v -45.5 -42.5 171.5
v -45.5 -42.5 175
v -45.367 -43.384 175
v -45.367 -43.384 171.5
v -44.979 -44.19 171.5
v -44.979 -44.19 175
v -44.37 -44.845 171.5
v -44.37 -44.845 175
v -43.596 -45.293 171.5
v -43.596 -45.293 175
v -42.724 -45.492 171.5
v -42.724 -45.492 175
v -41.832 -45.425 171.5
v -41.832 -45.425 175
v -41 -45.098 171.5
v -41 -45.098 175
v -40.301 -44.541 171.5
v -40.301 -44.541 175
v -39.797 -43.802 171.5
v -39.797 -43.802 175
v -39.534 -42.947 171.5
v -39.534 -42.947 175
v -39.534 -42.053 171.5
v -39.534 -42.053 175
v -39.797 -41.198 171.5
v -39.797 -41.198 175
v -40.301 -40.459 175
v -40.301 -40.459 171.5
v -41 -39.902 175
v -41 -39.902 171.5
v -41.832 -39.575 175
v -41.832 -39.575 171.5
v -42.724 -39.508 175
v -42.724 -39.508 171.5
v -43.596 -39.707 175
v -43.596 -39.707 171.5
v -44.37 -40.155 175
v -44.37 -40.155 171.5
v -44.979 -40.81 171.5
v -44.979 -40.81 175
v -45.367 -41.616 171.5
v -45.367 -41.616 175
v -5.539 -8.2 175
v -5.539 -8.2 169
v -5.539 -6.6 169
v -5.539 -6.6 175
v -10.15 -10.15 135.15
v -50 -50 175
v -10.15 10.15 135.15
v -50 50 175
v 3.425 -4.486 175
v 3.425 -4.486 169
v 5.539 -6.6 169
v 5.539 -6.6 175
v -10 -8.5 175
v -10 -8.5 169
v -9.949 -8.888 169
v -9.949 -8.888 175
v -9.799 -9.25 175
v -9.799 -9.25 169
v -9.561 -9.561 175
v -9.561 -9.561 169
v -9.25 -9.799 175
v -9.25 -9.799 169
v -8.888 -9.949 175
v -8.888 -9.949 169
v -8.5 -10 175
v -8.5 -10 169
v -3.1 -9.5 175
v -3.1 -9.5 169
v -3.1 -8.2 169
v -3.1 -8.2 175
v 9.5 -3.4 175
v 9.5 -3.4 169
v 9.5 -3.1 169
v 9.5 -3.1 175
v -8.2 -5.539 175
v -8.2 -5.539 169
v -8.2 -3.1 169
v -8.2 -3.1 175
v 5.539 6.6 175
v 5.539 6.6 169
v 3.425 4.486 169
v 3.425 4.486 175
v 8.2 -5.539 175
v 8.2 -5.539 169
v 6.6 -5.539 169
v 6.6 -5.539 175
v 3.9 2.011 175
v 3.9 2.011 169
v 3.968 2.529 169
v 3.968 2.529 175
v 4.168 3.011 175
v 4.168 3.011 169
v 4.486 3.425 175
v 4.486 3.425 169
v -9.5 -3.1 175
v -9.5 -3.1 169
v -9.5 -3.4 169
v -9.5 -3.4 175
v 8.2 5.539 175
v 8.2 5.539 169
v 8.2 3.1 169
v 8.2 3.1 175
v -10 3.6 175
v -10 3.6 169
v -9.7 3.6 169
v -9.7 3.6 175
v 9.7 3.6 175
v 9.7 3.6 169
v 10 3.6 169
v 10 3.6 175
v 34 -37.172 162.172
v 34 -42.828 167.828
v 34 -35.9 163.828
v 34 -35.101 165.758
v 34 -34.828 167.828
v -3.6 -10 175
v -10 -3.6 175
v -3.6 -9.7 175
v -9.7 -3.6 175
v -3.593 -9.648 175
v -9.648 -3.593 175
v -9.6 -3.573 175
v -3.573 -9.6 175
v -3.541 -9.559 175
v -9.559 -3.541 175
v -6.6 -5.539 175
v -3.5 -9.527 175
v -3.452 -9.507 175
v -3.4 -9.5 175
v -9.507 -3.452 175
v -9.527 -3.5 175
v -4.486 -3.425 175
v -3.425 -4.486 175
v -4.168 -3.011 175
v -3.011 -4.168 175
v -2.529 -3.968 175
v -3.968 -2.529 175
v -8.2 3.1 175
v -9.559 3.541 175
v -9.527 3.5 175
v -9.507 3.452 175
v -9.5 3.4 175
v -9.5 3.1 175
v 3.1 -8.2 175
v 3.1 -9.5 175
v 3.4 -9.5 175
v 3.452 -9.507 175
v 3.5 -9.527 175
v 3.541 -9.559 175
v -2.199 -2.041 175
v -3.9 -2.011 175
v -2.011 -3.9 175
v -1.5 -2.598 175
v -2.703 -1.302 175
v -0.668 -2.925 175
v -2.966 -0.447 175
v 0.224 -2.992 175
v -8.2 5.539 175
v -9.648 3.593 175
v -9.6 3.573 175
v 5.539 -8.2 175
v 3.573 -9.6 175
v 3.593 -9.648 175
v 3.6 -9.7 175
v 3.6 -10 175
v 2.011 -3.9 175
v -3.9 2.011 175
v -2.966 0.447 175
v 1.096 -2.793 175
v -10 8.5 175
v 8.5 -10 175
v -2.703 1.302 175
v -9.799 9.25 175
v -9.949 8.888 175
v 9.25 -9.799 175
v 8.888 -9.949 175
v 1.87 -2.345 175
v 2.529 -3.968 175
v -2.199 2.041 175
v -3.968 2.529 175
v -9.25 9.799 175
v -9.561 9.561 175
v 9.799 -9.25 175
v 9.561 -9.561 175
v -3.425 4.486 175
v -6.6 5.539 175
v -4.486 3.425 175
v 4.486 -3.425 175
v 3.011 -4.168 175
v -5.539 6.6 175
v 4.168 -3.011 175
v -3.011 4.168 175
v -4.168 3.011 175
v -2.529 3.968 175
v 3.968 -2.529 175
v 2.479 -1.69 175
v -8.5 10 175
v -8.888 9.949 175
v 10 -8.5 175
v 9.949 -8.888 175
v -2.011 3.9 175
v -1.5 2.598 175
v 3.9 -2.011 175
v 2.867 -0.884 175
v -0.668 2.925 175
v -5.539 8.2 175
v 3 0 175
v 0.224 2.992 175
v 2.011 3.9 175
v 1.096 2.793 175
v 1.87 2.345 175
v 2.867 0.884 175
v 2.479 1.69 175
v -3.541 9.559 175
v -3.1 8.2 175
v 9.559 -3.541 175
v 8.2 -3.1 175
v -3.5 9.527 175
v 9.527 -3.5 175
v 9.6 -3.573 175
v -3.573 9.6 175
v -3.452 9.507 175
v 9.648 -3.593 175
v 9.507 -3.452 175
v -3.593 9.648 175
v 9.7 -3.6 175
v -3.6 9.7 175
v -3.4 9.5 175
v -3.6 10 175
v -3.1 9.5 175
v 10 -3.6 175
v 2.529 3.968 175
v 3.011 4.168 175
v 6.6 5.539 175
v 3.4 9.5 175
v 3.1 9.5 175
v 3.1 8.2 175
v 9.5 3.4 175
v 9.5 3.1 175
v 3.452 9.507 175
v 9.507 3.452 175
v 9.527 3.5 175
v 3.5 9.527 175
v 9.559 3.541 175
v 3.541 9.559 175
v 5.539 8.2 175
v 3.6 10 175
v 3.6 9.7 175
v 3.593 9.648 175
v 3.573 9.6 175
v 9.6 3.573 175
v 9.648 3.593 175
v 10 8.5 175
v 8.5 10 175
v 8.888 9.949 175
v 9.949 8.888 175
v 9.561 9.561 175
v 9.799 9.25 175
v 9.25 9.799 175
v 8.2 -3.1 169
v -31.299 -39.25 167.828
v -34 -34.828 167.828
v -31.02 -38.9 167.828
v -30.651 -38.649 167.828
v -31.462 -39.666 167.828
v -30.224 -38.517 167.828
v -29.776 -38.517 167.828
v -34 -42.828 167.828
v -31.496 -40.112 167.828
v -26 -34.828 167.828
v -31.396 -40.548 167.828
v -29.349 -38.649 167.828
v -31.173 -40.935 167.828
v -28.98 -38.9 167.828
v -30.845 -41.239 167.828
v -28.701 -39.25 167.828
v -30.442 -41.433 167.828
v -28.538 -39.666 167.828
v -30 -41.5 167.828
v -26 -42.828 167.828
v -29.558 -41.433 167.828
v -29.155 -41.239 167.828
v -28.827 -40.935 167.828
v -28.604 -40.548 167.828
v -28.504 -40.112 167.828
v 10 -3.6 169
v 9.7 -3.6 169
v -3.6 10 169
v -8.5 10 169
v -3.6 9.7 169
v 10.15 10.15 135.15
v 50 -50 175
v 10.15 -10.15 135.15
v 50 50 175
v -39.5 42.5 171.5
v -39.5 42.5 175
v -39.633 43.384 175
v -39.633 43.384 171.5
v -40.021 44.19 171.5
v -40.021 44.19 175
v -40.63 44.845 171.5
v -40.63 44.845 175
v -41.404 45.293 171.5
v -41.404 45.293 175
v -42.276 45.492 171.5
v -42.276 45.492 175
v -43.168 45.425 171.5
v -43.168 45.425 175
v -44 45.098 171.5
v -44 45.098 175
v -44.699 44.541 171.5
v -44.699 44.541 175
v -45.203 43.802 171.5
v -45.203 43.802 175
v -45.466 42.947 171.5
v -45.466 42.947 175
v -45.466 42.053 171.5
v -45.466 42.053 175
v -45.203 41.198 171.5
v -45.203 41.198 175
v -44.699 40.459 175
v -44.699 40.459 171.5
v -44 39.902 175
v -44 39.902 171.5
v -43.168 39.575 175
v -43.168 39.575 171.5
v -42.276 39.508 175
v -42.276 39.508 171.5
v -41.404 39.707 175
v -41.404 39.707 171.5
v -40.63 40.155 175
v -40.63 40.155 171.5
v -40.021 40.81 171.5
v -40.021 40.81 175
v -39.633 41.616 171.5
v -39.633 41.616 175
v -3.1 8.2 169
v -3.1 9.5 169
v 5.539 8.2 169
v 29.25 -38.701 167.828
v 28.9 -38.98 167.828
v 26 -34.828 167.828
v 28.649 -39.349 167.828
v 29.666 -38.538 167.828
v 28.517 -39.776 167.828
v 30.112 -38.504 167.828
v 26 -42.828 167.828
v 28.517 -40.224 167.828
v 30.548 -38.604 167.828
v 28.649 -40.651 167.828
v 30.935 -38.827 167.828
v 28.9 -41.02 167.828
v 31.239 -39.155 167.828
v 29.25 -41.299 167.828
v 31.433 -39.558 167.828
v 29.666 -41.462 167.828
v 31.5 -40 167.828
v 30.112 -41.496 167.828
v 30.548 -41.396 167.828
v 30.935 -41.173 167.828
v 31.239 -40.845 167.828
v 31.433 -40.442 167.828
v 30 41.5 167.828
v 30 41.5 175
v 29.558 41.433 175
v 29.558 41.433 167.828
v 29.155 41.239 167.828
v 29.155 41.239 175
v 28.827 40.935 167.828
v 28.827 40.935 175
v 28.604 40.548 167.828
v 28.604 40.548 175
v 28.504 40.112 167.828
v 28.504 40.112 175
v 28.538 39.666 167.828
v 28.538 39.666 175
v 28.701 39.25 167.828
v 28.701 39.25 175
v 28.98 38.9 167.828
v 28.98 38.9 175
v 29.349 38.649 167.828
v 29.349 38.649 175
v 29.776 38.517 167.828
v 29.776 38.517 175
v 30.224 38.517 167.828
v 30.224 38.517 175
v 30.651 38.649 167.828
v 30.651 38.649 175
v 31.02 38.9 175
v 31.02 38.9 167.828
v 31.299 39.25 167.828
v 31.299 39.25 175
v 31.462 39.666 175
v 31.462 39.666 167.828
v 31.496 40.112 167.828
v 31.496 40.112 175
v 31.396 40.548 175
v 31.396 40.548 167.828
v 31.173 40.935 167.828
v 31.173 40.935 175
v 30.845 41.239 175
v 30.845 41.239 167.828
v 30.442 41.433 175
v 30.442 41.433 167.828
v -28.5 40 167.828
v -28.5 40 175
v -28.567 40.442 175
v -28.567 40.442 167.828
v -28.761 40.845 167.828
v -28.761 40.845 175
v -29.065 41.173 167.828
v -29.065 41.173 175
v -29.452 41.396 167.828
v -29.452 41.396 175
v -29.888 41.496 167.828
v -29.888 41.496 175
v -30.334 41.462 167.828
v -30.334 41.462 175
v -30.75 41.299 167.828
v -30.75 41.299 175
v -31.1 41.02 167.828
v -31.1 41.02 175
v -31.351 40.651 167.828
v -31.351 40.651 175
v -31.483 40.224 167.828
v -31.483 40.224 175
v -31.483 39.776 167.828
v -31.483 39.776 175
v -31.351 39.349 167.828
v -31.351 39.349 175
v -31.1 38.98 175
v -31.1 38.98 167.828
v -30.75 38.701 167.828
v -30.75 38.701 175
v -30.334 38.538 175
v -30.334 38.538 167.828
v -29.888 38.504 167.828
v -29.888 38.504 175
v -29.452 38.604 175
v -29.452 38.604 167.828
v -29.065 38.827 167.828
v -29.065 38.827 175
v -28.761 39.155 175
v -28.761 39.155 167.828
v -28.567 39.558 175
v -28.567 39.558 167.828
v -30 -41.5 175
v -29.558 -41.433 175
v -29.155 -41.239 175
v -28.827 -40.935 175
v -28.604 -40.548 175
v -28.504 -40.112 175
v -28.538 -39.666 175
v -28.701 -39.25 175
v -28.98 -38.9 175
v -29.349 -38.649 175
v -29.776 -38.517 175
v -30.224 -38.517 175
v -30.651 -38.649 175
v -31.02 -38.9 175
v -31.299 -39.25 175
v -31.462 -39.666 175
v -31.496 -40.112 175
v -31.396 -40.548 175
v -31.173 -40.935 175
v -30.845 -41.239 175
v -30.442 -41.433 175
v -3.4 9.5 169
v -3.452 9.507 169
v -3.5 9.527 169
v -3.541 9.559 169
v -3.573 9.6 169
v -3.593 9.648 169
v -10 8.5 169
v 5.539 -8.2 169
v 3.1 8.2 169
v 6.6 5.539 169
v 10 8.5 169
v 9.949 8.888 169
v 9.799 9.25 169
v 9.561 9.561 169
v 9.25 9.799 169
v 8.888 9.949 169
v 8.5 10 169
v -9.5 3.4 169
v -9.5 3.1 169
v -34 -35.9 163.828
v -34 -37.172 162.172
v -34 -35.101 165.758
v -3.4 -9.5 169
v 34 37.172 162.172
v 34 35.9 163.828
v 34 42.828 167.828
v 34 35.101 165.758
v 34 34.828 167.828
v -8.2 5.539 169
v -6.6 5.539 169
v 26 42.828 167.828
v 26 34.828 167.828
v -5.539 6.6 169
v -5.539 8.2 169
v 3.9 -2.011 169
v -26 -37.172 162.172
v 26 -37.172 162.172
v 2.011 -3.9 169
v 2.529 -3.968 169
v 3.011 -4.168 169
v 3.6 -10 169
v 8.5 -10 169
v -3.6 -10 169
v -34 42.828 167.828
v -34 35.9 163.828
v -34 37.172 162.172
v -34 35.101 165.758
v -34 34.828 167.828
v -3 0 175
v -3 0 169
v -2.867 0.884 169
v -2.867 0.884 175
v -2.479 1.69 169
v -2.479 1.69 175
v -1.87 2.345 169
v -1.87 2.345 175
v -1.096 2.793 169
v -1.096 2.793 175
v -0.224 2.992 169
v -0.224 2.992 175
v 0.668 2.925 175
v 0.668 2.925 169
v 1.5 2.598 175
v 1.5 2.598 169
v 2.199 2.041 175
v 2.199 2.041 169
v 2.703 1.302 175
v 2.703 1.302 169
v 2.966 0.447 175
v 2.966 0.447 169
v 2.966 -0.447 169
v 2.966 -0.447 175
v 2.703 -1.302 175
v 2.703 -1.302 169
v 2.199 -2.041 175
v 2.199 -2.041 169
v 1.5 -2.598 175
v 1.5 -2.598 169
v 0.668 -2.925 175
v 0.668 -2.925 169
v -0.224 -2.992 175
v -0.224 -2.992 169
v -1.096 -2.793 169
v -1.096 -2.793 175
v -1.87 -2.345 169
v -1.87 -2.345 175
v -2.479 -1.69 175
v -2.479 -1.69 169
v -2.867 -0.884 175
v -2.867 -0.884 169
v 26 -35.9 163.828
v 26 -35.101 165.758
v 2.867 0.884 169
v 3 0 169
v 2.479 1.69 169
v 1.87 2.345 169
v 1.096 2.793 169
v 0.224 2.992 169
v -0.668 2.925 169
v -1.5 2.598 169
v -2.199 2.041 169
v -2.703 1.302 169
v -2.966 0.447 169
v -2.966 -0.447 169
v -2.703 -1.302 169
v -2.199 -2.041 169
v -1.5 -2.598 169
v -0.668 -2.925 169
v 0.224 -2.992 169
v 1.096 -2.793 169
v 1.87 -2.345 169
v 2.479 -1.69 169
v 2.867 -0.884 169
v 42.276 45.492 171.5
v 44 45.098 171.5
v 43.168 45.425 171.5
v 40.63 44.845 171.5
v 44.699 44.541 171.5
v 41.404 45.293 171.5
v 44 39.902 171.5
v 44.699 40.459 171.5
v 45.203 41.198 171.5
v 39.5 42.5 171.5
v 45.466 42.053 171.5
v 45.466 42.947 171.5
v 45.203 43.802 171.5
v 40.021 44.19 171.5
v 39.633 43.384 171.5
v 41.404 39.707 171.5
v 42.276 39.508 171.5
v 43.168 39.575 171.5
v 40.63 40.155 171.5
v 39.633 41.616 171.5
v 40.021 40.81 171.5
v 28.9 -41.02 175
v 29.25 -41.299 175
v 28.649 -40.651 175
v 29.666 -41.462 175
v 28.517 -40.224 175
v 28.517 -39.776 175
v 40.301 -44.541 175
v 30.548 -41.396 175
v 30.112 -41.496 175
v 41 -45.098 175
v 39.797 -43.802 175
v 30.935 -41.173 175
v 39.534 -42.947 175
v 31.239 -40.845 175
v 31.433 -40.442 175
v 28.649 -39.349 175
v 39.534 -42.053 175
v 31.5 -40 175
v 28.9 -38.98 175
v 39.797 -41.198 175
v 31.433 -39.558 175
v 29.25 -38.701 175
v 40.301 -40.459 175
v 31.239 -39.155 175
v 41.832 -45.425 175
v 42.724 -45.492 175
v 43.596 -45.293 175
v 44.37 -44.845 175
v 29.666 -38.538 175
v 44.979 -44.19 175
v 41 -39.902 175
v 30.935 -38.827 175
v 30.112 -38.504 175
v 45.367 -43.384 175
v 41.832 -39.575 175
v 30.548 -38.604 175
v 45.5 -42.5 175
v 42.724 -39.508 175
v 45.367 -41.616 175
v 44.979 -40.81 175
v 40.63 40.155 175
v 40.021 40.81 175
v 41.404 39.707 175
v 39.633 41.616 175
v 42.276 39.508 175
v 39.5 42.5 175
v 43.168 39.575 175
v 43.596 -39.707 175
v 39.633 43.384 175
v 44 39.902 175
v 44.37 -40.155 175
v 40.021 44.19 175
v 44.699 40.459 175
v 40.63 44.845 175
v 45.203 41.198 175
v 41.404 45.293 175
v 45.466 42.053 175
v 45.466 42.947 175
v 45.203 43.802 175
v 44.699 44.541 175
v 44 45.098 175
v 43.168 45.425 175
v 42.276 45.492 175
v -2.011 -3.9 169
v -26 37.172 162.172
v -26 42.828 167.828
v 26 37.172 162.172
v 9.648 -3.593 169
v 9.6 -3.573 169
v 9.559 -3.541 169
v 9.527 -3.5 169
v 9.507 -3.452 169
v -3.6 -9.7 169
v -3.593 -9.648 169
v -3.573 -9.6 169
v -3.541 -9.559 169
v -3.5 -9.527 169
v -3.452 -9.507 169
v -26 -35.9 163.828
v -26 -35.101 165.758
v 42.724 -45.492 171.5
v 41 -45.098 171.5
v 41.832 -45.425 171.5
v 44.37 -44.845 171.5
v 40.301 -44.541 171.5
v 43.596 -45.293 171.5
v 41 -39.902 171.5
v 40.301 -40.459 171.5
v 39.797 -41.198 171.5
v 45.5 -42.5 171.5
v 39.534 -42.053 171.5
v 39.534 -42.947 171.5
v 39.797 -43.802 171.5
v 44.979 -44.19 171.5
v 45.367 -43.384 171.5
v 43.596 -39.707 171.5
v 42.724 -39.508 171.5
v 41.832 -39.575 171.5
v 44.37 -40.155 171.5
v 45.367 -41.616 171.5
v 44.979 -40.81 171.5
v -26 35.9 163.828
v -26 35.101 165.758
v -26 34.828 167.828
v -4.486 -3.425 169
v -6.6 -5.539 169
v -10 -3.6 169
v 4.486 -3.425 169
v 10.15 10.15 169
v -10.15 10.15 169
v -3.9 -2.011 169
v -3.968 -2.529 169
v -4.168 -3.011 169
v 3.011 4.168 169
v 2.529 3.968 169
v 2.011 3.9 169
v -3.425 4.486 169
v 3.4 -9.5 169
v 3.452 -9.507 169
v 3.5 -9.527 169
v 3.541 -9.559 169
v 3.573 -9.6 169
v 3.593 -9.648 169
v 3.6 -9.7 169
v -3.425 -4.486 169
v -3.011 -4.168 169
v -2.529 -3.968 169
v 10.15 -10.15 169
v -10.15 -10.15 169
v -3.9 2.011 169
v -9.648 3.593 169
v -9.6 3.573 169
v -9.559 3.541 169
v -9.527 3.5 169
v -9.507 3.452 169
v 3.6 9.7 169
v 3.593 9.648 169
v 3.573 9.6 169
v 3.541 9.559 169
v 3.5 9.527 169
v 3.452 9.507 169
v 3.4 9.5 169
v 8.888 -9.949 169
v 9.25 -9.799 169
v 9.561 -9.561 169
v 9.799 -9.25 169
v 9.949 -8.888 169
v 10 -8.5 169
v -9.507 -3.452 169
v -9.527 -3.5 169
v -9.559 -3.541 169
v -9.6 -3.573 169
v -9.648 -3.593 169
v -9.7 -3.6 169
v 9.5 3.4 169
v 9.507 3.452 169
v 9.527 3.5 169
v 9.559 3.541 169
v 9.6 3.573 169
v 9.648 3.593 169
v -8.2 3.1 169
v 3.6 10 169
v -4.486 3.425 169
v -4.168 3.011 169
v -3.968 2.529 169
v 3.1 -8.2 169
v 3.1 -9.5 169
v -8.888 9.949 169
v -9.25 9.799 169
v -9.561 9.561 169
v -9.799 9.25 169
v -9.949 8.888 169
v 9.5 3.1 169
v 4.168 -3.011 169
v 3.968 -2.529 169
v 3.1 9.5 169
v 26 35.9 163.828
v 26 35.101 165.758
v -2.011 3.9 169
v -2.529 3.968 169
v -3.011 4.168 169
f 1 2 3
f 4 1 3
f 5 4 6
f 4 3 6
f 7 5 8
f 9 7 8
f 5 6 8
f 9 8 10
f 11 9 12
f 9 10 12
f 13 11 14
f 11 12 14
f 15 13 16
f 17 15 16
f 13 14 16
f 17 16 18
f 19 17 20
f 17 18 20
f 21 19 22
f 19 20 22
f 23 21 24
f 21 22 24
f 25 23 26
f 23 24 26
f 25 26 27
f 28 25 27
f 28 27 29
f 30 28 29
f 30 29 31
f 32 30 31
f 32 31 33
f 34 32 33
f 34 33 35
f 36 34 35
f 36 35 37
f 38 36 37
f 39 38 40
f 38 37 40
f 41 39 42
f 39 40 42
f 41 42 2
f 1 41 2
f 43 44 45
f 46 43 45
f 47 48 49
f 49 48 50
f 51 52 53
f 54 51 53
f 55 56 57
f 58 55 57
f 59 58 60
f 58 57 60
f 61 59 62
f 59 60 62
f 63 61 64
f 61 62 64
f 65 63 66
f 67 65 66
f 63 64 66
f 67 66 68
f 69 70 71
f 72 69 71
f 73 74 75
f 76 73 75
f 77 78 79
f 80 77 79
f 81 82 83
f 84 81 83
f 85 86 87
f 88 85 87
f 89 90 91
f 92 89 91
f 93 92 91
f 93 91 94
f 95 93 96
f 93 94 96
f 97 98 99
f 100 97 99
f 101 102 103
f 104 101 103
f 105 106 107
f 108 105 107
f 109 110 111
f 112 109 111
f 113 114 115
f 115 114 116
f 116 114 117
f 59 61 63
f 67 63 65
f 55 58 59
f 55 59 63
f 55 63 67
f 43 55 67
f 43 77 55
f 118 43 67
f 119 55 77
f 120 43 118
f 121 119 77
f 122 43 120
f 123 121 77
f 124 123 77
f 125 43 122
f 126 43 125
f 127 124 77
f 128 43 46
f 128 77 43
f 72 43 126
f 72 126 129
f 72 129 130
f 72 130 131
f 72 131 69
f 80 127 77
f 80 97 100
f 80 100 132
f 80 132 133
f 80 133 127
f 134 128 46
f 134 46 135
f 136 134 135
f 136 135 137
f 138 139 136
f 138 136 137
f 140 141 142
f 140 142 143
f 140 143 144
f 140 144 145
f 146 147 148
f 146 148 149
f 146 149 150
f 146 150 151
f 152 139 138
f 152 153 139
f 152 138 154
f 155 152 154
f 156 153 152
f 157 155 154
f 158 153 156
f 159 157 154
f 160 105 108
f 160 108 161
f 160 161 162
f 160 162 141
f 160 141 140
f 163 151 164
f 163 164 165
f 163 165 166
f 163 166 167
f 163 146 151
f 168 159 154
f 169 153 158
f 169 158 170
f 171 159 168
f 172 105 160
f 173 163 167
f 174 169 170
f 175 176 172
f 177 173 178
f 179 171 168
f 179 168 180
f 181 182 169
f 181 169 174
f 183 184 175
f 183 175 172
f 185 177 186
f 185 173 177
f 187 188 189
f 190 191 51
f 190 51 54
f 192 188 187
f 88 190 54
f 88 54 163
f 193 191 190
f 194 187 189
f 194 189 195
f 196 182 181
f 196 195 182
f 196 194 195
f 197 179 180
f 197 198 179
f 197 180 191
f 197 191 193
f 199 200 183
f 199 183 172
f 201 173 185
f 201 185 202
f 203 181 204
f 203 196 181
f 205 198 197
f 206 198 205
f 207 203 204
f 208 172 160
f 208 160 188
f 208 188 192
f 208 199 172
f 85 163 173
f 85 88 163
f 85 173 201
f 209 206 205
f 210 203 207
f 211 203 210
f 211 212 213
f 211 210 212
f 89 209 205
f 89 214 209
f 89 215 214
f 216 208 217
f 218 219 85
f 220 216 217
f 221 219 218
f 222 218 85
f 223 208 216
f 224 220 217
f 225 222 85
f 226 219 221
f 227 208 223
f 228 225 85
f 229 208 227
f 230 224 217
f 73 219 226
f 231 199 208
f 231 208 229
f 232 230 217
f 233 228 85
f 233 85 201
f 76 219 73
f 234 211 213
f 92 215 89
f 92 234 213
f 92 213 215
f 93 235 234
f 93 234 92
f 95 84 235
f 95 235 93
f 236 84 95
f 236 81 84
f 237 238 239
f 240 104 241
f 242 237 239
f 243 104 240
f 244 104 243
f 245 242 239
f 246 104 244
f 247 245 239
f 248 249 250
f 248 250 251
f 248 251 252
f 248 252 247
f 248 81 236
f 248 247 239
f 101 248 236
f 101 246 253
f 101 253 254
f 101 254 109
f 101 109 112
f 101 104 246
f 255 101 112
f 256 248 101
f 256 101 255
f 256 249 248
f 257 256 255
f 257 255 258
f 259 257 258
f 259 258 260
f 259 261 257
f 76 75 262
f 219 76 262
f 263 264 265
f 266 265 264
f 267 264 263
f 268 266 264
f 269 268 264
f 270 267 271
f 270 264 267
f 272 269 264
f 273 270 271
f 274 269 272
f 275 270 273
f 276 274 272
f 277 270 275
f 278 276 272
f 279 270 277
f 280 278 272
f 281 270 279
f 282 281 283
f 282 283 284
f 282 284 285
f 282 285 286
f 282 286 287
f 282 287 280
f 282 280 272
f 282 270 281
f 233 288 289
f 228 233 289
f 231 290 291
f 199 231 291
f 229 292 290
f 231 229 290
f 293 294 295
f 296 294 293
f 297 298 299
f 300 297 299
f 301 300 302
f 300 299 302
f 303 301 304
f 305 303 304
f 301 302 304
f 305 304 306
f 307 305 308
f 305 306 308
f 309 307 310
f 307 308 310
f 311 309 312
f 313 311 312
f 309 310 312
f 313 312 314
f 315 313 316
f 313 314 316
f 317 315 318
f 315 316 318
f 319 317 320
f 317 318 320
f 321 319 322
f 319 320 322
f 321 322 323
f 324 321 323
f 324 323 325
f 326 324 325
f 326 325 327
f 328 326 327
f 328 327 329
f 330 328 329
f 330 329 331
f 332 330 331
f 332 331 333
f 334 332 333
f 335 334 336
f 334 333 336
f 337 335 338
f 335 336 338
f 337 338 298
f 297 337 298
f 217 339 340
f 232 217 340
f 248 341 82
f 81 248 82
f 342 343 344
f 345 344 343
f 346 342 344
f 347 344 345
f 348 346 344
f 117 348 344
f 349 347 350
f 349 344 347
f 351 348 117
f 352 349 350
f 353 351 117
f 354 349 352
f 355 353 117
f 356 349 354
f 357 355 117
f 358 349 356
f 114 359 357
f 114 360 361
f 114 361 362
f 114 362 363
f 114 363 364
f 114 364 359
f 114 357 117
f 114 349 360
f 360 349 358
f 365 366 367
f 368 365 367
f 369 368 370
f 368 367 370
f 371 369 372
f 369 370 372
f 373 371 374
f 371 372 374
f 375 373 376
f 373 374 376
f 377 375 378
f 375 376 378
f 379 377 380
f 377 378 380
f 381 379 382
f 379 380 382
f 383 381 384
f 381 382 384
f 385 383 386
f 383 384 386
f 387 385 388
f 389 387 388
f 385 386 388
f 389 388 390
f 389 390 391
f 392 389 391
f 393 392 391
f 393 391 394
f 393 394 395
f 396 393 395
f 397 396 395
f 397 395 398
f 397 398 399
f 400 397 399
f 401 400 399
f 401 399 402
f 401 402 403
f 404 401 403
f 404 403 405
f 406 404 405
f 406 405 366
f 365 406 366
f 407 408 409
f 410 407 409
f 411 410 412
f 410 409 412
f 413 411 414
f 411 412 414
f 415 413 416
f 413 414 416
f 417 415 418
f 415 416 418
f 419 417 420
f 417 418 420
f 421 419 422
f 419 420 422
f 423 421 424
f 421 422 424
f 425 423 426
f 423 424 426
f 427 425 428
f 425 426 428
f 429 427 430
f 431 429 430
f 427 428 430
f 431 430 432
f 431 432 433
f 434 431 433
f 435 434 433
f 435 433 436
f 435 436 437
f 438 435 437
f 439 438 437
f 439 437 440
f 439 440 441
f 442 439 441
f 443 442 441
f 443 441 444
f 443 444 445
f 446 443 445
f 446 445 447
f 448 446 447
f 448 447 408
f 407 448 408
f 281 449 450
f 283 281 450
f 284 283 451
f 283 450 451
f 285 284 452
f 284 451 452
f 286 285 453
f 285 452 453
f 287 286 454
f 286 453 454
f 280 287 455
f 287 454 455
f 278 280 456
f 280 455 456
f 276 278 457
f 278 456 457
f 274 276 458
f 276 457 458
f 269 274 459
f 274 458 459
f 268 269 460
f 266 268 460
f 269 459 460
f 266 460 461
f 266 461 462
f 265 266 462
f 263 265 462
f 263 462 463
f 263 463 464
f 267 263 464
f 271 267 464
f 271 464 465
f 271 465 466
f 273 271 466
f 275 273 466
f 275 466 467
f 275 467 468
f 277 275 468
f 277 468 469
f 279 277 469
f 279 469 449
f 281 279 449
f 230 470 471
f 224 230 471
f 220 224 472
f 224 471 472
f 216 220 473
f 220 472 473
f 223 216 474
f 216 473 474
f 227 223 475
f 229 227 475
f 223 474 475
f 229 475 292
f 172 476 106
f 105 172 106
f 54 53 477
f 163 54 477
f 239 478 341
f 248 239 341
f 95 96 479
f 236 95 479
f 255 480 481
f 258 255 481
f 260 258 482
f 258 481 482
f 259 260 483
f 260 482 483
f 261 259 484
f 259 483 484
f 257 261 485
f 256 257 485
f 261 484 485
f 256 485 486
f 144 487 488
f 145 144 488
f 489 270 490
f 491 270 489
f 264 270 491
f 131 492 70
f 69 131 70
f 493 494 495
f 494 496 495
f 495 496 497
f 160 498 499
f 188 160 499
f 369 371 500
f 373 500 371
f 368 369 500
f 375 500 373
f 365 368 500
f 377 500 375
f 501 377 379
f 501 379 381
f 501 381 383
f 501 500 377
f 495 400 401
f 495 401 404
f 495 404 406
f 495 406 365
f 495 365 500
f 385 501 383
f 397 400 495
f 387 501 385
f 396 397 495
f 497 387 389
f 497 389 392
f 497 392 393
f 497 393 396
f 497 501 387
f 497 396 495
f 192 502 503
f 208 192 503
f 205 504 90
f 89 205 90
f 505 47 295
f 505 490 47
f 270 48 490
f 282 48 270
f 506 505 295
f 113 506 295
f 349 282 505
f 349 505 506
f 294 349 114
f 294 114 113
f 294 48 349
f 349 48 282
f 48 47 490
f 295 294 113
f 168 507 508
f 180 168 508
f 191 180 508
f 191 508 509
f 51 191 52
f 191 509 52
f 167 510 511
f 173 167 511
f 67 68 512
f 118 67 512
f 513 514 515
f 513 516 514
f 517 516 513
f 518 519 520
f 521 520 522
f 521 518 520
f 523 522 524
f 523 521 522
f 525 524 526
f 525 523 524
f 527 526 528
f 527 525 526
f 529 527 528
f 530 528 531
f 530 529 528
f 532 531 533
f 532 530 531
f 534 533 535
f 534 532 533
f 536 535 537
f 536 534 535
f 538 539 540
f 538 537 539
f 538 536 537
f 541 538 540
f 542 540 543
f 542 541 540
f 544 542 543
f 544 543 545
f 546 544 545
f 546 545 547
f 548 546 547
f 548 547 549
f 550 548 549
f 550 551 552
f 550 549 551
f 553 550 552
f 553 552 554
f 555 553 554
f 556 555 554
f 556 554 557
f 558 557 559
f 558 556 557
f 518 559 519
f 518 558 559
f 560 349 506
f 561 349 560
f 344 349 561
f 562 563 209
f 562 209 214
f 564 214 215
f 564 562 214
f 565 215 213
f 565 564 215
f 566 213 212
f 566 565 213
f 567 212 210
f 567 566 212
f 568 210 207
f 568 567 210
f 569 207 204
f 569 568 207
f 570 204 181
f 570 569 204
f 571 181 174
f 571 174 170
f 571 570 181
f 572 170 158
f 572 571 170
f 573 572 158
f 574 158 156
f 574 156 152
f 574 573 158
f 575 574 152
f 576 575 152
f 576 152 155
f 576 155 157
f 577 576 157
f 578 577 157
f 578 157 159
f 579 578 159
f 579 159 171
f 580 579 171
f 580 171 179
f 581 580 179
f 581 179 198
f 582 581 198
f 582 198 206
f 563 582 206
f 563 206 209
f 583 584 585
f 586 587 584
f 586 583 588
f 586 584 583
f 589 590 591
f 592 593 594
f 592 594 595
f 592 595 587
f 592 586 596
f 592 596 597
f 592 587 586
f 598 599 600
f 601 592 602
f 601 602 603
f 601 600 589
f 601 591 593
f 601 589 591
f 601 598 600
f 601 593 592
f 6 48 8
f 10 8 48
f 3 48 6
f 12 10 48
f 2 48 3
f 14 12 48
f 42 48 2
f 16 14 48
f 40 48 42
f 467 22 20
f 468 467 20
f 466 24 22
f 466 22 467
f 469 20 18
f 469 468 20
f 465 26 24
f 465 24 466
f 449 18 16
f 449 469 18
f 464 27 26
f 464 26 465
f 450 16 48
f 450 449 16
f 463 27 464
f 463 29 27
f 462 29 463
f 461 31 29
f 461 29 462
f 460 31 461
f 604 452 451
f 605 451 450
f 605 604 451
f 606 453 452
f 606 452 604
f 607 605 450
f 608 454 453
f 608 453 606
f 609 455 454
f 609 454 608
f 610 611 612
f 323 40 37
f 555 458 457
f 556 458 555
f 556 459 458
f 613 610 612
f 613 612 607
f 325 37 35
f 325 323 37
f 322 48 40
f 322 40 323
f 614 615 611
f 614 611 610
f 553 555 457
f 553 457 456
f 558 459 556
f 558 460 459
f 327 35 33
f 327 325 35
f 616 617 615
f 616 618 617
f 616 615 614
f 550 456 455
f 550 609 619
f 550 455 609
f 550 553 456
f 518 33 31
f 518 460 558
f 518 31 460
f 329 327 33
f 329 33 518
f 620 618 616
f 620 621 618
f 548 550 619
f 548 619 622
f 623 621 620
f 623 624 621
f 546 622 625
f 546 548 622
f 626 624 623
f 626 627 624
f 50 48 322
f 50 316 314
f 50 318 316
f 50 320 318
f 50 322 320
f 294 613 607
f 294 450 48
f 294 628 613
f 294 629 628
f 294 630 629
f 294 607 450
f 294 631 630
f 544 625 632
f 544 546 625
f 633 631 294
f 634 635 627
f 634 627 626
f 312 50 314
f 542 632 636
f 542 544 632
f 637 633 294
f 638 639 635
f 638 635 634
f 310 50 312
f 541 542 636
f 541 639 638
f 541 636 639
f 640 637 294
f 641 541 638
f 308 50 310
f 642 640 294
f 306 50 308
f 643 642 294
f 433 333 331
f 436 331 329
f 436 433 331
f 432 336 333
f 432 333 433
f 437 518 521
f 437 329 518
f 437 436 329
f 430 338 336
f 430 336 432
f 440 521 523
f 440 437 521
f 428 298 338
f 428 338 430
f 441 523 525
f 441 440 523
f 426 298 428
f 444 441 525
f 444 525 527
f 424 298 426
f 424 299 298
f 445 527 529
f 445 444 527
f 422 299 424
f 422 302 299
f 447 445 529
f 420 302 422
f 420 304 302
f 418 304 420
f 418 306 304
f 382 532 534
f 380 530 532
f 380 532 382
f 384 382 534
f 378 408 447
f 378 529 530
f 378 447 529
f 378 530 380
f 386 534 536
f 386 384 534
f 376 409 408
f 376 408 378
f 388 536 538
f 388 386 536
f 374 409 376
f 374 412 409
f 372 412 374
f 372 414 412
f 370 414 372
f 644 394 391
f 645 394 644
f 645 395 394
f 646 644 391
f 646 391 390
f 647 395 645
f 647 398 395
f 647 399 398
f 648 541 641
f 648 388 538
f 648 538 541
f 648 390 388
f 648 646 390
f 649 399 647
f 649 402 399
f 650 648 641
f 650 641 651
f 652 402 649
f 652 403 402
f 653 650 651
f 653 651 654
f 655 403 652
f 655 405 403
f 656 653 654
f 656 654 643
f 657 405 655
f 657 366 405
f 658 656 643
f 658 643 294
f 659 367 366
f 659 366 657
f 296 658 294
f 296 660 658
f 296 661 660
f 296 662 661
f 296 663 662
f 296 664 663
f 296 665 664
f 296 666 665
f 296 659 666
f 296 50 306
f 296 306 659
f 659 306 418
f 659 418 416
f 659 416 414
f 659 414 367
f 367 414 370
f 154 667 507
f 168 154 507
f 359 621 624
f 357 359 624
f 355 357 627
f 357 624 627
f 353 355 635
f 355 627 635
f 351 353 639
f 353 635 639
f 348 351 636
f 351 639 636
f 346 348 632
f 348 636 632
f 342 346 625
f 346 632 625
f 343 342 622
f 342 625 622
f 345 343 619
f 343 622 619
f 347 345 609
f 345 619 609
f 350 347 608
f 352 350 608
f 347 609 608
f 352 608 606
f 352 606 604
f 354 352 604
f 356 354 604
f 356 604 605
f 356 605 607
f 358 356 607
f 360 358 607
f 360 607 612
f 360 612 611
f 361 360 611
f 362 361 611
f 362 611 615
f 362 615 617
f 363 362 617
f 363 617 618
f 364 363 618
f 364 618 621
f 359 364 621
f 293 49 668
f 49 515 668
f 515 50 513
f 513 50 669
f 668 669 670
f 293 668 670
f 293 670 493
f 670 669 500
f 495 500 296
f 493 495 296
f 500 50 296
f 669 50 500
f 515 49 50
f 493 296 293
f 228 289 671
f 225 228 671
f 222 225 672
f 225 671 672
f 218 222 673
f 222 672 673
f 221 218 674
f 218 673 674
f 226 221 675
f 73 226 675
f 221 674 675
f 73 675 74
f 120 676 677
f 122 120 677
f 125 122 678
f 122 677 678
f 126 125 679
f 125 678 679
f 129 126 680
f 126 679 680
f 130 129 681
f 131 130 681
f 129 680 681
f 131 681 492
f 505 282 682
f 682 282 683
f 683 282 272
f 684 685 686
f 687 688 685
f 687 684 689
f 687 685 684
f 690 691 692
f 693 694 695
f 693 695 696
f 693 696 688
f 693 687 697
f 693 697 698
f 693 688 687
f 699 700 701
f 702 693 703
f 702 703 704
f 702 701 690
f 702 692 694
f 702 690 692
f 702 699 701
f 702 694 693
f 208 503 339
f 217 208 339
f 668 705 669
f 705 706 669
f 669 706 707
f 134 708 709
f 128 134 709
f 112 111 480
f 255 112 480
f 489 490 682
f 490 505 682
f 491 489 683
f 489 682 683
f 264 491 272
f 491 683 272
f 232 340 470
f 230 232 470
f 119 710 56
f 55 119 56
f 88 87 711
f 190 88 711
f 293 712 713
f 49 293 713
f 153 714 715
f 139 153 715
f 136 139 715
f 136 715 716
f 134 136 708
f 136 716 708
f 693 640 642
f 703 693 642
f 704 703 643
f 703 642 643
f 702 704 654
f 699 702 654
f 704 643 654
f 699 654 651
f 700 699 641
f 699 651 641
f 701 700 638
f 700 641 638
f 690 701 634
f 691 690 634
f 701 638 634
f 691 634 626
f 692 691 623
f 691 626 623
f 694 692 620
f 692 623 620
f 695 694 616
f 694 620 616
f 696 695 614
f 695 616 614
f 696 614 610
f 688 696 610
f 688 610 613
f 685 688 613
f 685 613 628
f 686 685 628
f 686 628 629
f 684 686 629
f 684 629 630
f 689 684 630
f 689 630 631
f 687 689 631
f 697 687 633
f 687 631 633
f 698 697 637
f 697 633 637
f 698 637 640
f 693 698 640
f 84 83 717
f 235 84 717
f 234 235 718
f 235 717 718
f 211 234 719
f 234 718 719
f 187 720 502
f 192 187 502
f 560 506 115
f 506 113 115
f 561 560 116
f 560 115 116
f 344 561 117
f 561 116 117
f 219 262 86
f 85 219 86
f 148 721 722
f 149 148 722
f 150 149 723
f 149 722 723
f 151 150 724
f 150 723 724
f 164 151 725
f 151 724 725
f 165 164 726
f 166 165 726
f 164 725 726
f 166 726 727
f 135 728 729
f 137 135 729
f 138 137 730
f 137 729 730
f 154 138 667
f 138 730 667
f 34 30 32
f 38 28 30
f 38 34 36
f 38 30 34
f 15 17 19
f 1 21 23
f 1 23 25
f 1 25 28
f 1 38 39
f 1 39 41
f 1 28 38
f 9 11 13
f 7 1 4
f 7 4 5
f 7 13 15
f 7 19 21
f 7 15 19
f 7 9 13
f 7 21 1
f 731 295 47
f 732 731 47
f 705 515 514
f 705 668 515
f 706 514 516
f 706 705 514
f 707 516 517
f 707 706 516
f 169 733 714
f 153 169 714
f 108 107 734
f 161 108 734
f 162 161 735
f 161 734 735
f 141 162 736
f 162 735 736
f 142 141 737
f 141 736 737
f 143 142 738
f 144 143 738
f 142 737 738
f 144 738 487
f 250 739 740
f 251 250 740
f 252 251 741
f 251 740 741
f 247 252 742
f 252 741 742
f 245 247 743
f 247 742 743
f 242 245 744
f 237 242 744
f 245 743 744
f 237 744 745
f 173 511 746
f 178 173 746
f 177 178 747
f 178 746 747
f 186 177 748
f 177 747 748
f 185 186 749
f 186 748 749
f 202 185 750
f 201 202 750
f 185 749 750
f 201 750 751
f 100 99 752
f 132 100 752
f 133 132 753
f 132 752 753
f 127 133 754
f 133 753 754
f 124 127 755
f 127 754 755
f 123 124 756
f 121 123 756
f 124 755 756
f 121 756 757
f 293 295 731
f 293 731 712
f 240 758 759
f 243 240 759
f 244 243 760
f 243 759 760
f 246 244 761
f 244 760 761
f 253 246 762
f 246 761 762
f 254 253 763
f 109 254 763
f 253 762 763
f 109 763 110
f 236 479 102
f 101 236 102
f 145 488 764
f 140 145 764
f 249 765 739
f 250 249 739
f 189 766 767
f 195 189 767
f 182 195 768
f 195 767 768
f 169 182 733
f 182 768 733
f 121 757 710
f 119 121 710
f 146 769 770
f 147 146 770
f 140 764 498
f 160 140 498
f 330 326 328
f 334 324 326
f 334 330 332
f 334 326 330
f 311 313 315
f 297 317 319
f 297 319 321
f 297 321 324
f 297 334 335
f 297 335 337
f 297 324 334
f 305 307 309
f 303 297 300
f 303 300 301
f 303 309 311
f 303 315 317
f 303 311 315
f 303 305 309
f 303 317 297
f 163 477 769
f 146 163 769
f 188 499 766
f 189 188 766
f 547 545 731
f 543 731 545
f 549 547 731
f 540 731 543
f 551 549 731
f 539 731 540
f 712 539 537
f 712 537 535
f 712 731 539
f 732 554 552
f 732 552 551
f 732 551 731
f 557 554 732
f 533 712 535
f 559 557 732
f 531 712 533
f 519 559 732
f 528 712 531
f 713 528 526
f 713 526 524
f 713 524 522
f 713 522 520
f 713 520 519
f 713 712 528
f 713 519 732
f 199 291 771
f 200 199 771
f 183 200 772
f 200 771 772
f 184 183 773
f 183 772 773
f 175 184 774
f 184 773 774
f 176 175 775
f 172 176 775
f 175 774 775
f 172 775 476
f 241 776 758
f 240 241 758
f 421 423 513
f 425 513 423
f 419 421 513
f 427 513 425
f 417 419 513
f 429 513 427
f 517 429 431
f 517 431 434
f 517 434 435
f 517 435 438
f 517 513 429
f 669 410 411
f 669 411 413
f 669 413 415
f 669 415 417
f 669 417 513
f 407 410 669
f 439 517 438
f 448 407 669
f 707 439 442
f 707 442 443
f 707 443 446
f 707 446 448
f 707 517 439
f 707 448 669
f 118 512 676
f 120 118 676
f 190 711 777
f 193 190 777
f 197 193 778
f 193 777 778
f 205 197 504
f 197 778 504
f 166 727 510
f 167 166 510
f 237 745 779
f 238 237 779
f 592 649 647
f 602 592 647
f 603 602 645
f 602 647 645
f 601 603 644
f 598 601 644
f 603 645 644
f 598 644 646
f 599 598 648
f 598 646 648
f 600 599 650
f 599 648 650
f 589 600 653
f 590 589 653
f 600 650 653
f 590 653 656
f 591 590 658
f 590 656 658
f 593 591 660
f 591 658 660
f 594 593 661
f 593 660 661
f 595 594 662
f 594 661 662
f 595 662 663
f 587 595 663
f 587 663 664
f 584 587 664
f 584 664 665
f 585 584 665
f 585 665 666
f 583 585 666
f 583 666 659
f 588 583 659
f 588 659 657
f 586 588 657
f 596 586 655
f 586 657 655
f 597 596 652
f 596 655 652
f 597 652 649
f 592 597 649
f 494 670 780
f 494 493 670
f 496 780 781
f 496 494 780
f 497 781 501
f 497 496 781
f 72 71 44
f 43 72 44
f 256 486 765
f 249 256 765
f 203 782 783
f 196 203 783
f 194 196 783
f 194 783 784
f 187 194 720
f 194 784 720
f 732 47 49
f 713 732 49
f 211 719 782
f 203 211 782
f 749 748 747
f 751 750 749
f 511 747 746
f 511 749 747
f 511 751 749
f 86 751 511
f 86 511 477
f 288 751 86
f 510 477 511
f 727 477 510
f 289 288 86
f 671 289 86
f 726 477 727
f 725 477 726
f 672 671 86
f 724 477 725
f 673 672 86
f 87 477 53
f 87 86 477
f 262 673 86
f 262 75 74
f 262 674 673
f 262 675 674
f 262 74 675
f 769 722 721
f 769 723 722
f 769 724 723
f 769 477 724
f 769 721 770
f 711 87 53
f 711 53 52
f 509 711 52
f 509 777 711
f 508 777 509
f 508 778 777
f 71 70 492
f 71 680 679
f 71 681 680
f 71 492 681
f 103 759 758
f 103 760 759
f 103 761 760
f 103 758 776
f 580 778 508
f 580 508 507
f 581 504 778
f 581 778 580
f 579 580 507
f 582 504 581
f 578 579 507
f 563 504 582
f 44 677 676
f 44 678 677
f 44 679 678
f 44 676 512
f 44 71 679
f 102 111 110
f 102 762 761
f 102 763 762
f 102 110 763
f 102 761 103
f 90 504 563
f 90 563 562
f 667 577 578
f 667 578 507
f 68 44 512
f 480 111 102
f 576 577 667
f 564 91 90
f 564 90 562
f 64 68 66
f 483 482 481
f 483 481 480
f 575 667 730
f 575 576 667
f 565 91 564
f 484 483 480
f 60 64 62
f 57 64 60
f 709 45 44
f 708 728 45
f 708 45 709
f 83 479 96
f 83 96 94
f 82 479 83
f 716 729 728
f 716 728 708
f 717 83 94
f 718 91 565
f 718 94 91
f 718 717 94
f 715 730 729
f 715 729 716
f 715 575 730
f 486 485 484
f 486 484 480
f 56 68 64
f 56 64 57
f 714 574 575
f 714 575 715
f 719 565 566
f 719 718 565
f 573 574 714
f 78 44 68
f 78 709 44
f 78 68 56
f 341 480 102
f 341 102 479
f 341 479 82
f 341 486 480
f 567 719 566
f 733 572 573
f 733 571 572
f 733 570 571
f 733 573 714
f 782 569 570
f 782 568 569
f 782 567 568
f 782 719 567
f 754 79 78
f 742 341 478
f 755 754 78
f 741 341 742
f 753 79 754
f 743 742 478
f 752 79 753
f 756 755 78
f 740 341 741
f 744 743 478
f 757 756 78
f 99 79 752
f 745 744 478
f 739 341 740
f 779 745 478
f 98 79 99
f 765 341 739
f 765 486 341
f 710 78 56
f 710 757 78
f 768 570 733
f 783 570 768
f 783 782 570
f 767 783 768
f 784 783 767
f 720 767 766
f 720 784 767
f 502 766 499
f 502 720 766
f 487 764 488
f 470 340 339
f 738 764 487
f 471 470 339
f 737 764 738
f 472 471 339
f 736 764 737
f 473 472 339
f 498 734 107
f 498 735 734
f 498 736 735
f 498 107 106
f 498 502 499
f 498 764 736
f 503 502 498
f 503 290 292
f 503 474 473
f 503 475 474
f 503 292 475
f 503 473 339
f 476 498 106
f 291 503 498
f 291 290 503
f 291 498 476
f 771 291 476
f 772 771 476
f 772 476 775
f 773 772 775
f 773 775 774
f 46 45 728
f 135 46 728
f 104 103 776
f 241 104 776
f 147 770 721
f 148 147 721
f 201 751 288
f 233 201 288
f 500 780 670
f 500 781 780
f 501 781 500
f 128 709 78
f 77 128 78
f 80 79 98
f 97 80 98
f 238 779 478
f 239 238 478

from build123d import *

# Parameters (mm, degrees)
SKETCH1_R                = 3
EXTRUDE_1_DEPTH          = 175
SKETCH_1_W               = 100
SKETCH_1_H               = 100
EXTRUDE_2_DEPTH          = 40
EXTRUDE_2_DRAFT          = -45
SKETCH_3_R               = 1.5
CUT_EXTRUDE_2_DEPTH      = 40
SKETCH_4_W               = 8
SKETCH_4_H               = 8
CUT_REVOLVE_1_ANGLE      = 45
CUT_EXTRUDE_4_DEPTH      = 189.745860882
CUT_EXTRUDE_4_DEPTH_BACK = 175
SKETCH_6_R               = 3
SKETCH_8_R               = 3
CUT_EXTRUDE_6_DEPTH      = 3.5
SKETCH_9_W               = 20.3
SKETCH_9_H               = 20.3
CUT_EXTRUDE_7_DEPTH      = 169
SKETCH_10_W              = 8
SKETCH_10_H              = 8
CUT_REVOLVE_3_ANGLE      = 45


with BuildPart() as part:
    # Sketch1 → Бобышка-Вытянуть1 (new body)
    with BuildSketch(Plane.XY):
        with BuildLine():
            Line((0, 3.9), (-2.010912703, 3.9))
            ThreePointArc((-2.010912703, 3.9), (-2.776279568, 4.052240935), (-3.425126266, 4.485786438))
            Line((-3.425126266, 4.485786438), (-5.539339828, 6.6))
            Line((-5.539339828, 6.6), (-5.539339828, 8.2))
            Line((-5.539339828, 8.2), (-3.1, 8.2))
            Line((-3.1, 8.2), (-3.1, 9.5))
            Line((-3.1, 9.5), (-3.4, 9.5))
            ThreePointArc((-3.4, 9.5), (-3.541421356, 9.558578644), (-3.6, 9.7))
            Line((-3.6, 9.7), (-3.6, 10))
            Line((-3.6, 10), (-8.5, 10))
            ThreePointArc((-8.5, 10), (-9.560660172, 9.560660172), (-10, 8.5))
            Line((-10, 8.5), (-10, 3.6))
            Line((-10, 3.6), (-9.7, 3.6))
            ThreePointArc((-9.7, 3.6), (-9.558578644, 3.541421356), (-9.5, 3.4))
            Line((-9.5, 3.4), (-9.5, 3.1))
            Line((-9.5, 3.1), (-8.2, 3.1))
            Line((-8.2, 3.1), (-8.2, 5.539339828))
            Line((-8.2, 5.539339828), (-6.6, 5.539339828))
            Line((-6.6, 5.539339828), (-4.485786438, 3.425126266))
            ThreePointArc((-4.485786438, 3.425126266), (-4.052240935, 2.776279568), (-3.9, 2.010912703))
            Line((-3.9, 2.010912703), (-3.9, 0))
            Line((-3.9, 0), (-3.9, -2.010912703))
            ThreePointArc((-3.9, -2.010912703), (-4.052240935, -2.776279568), (-4.485786438, -3.425126266))
            Line((-4.485786438, -3.425126266), (-6.6, -5.539339828))
            Line((-6.6, -5.539339828), (-8.2, -5.539339828))
            Line((-8.2, -5.539339828), (-8.2, -3.1))
            Line((-8.2, -3.1), (-9.5, -3.1))
            Line((-9.5, -3.1), (-9.5, -3.4))
            ThreePointArc((-9.5, -3.4), (-9.558578644, -3.541421356), (-9.7, -3.6))
            Line((-9.7, -3.6), (-10, -3.6))
            Line((-10, -3.6), (-10, -8.5))
            ThreePointArc((-10, -8.5), (-9.560660172, -9.560660172), (-8.5, -10))
            Line((-8.5, -10), (-3.6, -10))
            Line((-3.6, -10), (-3.6, -9.7))
            ThreePointArc((-3.6, -9.7), (-3.541421356, -9.558578644), (-3.4, -9.5))
            Line((-3.4, -9.5), (-3.1, -9.5))
            Line((-3.1, -9.5), (-3.1, -8.2))
            Line((-3.1, -8.2), (-5.539339828, -8.2))
            Line((-5.539339828, -8.2), (-5.539339828, -6.6))
            Line((-5.539339828, -6.6), (-3.425126266, -4.485786438))
            ThreePointArc((-3.425126266, -4.485786438), (-2.776279568, -4.052240935), (-2.010912703, -3.9))
            Line((-2.010912703, -3.9), (0, -3.9))
            Line((0, -3.9), (2.010912703, -3.9))
            ThreePointArc((2.010912703, -3.9), (2.776279568, -4.052240935), (3.425126266, -4.485786438))
            Line((3.425126266, -4.485786438), (5.539339828, -6.6))
            Line((5.539339828, -6.6), (5.539339828, -8.2))
            Line((5.539339828, -8.2), (3.1, -8.2))
            Line((3.1, -8.2), (3.1, -9.5))
            Line((3.1, -9.5), (3.4, -9.5))
            ThreePointArc((3.4, -9.5), (3.541421356, -9.558578644), (3.6, -9.7))
            Line((3.6, -9.7), (3.6, -10))
            Line((3.6, -10), (8.5, -10))
            ThreePointArc((8.5, -10), (9.560660172, -9.560660172), (10, -8.5))
            Line((10, -8.5), (10, -3.6))
            Line((10, -3.6), (9.7, -3.6))
            ThreePointArc((9.7, -3.6), (9.558578644, -3.541421356), (9.5, -3.4))
            Line((9.5, -3.4), (9.5, -3.1))
            Line((9.5, -3.1), (8.2, -3.1))
            Line((8.2, -3.1), (8.2, -5.539339828))
            Line((8.2, -5.539339828), (6.6, -5.539339828))
            Line((6.6, -5.539339828), (4.485786438, -3.425126266))
            ThreePointArc((4.485786438, -3.425126266), (4.052240935, -2.776279568), (3.9, -2.010912703))
            Line((3.9, -2.010912703), (3.9, 0))
            Line((3.9, 0), (3.9, 2.010912703))
            ThreePointArc((3.9, 2.010912703), (4.052240935, 2.776279568), (4.485786438, 3.425126266))
            Line((4.485786438, 3.425126266), (6.6, 5.539339828))
            Line((6.6, 5.539339828), (8.2, 5.539339828))
            Line((8.2, 5.539339828), (8.2, 3.1))
            Line((8.2, 3.1), (9.5, 3.1))
            Line((9.5, 3.1), (9.5, 3.4))
            ThreePointArc((9.5, 3.4), (9.558578644, 3.541421356), (9.7, 3.6))
            Line((9.7, 3.6), (10, 3.6))
            Line((10, 3.6), (10, 8.5))
            ThreePointArc((10, 8.5), (9.560660172, 9.560660172), (8.5, 10))
            Line((8.5, 10), (3.6, 10))
            Line((3.6, 10), (3.6, 9.7))
            ThreePointArc((3.6, 9.7), (3.541421356, 9.558578644), (3.4, 9.5))
            Line((3.4, 9.5), (3.1, 9.5))
            Line((3.1, 9.5), (3.1, 8.2))
            Line((3.1, 8.2), (5.539339828, 8.2))
            Line((5.539339828, 8.2), (5.539339828, 6.6))
            Line((5.539339828, 6.6), (3.425126266, 4.485786438))
            ThreePointArc((3.425126266, 4.485786438), (2.776279568, 4.052240935), (2.010912703, 3.9))
            Line((2.010912703, 3.9), (0, 3.9))
        make_face()
        Circle(SKETCH1_R, mode=Mode.SUBTRACT)
    extrude(amount=EXTRUDE_1_DEPTH)


with BuildPart() as body_2:
    # Эскиз1 → Бобышка-Вытянуть2 (with draft: the straight prism first)
    with BuildSketch(Plane.XY.offset(175)):
        Rectangle(SKETCH_1_W, SKETCH_1_H)
    extrude(amount=-EXTRUDE_2_DEPTH)
    # Бобышка-Вытянуть2: the draft: its side faces are tilted about the plane it starts from
    extrude_2_sides = [body_2.faces().sort_by_distance(p)[0] for p in [
        (0, -50, 155),
        (50, 0, 155),
        (0, 50, 155),
        (-50, 0, 155),
    ]]
    draft(extrude_2_sides, Plane.XY.offset(175), EXTRUDE_2_DRAFT)

    # Эскиз3 → Вырез-Вытянуть2 (cut)
    with BuildSketch(Plane.XY.offset(175)):
        with Locations((-30, 40)):
            Circle(SKETCH_3_R)
        with Locations(Location((30, 40, 0), (0, 0, 90))):
            Circle(SKETCH_3_R)
        with Locations((30, -40)):
            Circle(SKETCH_3_R)
        with Locations(Location((-30, -40, 0), (0, 0, 270))):
            Circle(SKETCH_3_R)
    extrude(amount=-CUT_EXTRUDE_2_DEPTH, mode=Mode.SUBTRACT)

    # Эскиз4 → Вырез-Повернуть1 (revolve, cut)
    with BuildSketch(Plane(origin=(0, 62.5, 62.5), x_dir=(1, 0, 0), z_dir=(0, -0.7071067811865462, -0.7071067811865488))):
        with Locations((-30, 144.956890143)):
            Rectangle(SKETCH_4_W, SKETCH_4_H)
        with Locations((30, 144.956890143)):
            Rectangle(SKETCH_4_W, SKETCH_4_H)
    revolve(axis=Axis((-34, -42.828427125, 167.828427125), (1, 0, 0)), revolution_arc=CUT_REVOLVE_1_ANGLE, mode=Mode.SUBTRACT)

    # Эскиз6 → Вырез-Вытянуть4 (cut, two sides: drawn at the far end of the back side and taken through both)
    with BuildSketch(Plane(origin=(0, 0, 0), x_dir=(-1, 0, 0), z_dir=(0, 0, -1)).offset(-CUT_EXTRUDE_4_DEPTH_BACK)):
        Circle(SKETCH_6_R)
    extrude(amount=CUT_EXTRUDE_4_DEPTH + CUT_EXTRUDE_4_DEPTH_BACK, mode=Mode.SUBTRACT)

    # Эскиз8 → Вырез-Вытянуть6 (cut)
    with BuildSketch(Plane.XY.offset(175)):
        with Locations((-42.5, 42.5)):
            Circle(SKETCH_8_R)
        with Locations(Location((42.5, 42.5, 0), (0, 0, 180))):
            Circle(SKETCH_8_R)
        with Locations((42.5, -42.5)):
            Circle(SKETCH_8_R)
        with Locations(Location((-42.5, -42.5, 0), (0, 0, 180))):
            Circle(SKETCH_8_R)
    extrude(amount=-CUT_EXTRUDE_6_DEPTH, mode=Mode.SUBTRACT)


with BuildPart() as cut_extrude_7_tool:
    # Эскиз9 → Вырез-Вытянуть7 (new body)
    with BuildSketch(Plane(origin=(0, 0, 0), x_dir=(-1, 0, 0), z_dir=(0, 0, -1))):
        Rectangle(SKETCH_9_W, SKETCH_9_H)
    extrude(amount=-CUT_EXTRUDE_7_DEPTH)


with BuildPart() as part_1:
    add(part.part)

    # Вырез-Вытянуть7: cut by cut_extrude_7_tool
    add(cut_extrude_7_tool.part, mode=Mode.SUBTRACT)


with BuildPart() as body_2_1:
    add(body_2.part)

    # Вырез-Вытянуть7: cut by cut_extrude_7_tool
    add(cut_extrude_7_tool.part, mode=Mode.SUBTRACT)

    # Эскиз10 → Вырез-Повернуть3 (revolve, cut)
    with BuildSketch(Plane(origin=(0, -62.5, 62.5), x_dir=(1, 0, 0), z_dir=(0, 0.7071067811865462, -0.7071067811865488))):
        with Locations((-30, -144.956890143)):
            Rectangle(SKETCH_10_W, SKETCH_10_H)
        with Locations((30, -144.956890143)):
            Rectangle(SKETCH_10_W, SKETCH_10_H)
    revolve(axis=Axis((34, 42.828427125, 167.828427125), (-1, 0, 0)), revolution_arc=CUT_REVOLVE_3_ANGLE, mode=Mode.SUBTRACT)


solid = Compound([part_1.part, body_2_1.part])
